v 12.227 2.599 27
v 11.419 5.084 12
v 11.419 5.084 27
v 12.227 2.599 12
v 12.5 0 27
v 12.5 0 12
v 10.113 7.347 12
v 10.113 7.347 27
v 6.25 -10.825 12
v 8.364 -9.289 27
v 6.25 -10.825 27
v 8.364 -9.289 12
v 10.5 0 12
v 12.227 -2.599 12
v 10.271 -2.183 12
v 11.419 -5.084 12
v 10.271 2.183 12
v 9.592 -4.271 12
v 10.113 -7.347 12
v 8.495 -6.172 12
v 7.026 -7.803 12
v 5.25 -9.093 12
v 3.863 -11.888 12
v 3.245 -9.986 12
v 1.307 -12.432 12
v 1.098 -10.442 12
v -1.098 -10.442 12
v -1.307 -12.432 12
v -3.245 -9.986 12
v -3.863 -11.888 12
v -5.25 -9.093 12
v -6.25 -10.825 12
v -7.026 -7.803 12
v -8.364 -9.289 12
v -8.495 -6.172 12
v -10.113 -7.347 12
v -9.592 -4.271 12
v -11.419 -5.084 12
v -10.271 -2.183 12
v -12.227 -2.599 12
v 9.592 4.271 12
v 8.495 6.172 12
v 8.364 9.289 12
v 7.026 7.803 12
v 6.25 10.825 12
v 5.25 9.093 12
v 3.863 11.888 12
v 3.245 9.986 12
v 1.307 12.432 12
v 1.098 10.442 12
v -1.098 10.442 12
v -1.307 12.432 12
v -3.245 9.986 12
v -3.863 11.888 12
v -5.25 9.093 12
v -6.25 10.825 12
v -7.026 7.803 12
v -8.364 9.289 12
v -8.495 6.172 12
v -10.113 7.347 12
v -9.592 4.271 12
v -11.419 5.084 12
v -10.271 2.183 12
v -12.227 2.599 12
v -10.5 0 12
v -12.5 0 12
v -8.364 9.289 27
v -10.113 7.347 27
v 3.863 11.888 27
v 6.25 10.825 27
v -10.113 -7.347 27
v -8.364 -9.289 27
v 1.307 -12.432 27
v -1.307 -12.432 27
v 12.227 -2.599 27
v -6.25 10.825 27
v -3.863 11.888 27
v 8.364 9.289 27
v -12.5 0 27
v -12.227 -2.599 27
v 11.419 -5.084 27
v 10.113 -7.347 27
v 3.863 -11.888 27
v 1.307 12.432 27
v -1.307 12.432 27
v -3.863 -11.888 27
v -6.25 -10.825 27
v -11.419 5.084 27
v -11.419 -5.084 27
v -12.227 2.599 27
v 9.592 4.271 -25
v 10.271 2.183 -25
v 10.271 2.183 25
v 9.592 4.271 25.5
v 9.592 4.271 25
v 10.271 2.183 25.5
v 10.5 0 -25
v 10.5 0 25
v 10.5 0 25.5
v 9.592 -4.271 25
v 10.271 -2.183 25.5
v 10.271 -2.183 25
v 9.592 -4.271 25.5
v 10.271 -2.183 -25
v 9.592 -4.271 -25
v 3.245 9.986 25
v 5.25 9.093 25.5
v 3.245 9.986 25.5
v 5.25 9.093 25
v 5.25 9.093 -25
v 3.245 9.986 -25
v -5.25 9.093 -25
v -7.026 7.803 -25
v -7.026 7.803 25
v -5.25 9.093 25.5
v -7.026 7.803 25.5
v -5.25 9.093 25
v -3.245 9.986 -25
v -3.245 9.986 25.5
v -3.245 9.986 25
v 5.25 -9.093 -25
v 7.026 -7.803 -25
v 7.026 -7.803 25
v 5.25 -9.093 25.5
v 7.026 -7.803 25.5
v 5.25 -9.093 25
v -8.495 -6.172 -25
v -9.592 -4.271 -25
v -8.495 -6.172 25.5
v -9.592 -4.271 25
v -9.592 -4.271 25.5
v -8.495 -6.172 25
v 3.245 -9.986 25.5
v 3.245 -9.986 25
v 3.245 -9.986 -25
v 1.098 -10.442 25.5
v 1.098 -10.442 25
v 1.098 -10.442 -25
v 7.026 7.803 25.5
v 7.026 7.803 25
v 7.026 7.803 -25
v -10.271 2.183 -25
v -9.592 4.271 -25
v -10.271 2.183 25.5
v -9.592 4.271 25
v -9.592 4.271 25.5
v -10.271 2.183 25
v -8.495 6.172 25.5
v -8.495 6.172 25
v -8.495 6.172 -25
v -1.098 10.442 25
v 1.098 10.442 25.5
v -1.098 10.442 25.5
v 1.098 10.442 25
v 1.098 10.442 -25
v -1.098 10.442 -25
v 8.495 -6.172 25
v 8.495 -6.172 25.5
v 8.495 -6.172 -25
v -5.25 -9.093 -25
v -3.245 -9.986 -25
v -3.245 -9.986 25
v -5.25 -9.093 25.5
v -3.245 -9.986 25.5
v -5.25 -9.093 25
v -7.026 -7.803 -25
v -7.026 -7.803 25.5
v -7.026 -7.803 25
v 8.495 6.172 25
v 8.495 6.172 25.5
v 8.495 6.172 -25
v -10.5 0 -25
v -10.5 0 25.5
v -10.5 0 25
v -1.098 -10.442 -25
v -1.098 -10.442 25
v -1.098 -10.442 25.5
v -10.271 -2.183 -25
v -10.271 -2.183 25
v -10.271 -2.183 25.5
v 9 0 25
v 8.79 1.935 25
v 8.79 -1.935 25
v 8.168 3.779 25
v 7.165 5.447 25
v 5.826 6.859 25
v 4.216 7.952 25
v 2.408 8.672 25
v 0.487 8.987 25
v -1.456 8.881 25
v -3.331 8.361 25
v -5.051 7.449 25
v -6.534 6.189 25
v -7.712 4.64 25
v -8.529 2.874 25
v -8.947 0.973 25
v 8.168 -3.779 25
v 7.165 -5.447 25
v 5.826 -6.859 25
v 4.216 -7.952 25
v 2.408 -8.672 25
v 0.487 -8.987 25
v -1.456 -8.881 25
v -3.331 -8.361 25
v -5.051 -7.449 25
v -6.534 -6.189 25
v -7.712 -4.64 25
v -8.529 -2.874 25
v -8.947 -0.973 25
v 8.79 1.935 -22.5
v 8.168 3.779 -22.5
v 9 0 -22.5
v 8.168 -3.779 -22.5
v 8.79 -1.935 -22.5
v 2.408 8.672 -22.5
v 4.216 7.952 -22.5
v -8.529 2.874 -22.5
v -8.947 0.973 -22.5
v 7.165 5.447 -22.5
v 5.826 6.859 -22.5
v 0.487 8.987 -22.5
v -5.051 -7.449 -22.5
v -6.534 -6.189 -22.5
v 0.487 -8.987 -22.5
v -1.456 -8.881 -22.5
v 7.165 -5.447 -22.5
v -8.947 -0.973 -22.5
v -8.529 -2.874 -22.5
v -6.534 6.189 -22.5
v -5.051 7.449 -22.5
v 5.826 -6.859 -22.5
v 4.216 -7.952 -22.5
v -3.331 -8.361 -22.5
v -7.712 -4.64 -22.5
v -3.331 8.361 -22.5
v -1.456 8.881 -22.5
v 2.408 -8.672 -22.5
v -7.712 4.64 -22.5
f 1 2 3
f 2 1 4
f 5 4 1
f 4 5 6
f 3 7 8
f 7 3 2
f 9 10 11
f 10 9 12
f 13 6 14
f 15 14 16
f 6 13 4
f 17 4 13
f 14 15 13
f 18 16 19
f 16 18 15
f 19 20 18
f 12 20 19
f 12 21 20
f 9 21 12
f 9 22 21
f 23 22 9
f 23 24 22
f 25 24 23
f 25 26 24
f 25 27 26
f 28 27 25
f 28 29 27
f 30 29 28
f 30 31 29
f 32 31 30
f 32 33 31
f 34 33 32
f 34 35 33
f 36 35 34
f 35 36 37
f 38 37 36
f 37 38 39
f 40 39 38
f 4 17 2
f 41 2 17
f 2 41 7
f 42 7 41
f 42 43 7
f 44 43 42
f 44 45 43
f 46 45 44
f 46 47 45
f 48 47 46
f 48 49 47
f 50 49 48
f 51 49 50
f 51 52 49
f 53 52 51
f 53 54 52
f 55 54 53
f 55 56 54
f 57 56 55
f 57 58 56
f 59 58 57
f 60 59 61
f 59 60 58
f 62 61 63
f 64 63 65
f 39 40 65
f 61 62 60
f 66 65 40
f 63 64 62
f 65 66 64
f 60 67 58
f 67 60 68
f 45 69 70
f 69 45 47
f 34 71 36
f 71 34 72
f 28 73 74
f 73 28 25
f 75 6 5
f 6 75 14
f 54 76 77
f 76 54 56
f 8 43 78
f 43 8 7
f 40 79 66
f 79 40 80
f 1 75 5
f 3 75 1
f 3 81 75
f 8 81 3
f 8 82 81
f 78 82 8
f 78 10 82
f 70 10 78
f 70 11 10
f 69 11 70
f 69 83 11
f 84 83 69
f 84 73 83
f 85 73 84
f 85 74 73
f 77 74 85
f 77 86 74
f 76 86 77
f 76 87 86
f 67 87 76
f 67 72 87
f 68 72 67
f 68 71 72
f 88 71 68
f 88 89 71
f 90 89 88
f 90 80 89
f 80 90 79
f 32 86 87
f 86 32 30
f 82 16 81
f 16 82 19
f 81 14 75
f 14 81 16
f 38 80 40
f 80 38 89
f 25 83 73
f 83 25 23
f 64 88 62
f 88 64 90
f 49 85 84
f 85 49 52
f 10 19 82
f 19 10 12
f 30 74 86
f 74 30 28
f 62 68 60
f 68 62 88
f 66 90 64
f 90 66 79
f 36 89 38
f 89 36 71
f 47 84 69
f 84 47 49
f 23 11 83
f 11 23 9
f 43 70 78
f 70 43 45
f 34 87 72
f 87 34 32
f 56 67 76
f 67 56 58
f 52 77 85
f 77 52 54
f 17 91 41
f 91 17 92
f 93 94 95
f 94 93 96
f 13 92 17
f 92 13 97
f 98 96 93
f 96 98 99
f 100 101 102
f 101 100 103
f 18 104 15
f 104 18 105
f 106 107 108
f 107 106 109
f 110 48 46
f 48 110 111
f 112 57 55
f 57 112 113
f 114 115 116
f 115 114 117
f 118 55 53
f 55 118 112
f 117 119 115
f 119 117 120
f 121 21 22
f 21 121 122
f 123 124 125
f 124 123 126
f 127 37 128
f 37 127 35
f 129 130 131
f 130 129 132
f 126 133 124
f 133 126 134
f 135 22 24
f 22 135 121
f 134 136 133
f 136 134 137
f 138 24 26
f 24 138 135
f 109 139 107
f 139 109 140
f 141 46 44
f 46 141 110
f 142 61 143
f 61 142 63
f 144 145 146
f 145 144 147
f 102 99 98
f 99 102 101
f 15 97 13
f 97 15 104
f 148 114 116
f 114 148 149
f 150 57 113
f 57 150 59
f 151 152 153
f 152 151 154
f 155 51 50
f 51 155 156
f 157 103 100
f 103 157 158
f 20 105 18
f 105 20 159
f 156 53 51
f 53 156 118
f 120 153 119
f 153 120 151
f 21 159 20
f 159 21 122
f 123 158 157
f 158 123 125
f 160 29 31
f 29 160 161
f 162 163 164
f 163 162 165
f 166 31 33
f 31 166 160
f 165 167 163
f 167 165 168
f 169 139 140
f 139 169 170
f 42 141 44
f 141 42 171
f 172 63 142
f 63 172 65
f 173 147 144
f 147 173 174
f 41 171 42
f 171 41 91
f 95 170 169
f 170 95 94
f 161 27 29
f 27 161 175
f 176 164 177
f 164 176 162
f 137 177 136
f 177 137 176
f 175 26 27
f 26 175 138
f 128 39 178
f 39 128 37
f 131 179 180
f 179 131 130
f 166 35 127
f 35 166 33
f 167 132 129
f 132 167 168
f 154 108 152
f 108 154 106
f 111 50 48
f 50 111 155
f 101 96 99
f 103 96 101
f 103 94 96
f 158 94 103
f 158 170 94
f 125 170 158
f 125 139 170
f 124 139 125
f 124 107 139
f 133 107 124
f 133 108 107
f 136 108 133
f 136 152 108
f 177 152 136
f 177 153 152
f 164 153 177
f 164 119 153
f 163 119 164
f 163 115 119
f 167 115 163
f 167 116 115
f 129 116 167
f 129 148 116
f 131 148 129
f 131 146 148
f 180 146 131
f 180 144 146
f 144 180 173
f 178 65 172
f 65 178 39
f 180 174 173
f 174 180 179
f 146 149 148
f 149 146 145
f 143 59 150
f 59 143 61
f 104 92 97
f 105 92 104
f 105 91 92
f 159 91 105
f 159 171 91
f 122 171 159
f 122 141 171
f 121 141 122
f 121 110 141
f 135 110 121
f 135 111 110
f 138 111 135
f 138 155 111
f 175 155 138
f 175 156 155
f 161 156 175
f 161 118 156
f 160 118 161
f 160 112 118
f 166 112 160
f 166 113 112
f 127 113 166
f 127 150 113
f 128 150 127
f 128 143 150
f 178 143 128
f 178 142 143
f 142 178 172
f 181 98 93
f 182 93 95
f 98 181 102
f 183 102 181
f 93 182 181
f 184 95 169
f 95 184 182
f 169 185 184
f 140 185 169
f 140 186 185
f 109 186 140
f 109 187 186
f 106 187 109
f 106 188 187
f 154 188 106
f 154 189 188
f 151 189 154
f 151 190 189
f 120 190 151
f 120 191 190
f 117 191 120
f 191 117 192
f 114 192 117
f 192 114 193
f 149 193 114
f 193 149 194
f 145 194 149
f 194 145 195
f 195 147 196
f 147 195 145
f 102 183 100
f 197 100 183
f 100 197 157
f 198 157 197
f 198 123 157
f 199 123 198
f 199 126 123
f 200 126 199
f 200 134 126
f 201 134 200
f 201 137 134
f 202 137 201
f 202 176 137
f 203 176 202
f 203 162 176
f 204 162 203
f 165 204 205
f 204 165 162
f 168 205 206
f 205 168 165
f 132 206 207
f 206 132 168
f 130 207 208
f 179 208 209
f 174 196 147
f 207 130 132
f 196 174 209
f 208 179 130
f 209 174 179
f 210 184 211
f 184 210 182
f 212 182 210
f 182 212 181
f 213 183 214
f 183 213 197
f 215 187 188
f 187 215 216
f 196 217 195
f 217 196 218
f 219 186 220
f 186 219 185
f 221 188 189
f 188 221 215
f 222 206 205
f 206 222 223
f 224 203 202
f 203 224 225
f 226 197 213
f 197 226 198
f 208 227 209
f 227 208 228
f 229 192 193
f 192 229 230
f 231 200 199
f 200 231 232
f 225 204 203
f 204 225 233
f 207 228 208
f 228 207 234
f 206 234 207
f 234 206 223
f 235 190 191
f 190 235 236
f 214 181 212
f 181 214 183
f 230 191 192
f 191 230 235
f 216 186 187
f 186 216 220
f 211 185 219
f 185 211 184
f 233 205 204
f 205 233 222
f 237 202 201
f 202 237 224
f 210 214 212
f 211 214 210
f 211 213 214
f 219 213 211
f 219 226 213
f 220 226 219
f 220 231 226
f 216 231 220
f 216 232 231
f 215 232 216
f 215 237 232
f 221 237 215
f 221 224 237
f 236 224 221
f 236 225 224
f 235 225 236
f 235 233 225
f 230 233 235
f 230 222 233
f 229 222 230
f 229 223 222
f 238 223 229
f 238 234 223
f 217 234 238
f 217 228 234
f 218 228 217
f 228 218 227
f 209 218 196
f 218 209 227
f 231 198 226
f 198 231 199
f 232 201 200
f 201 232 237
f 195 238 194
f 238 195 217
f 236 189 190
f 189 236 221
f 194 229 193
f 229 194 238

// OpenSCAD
hTube=50; // Hauteur pullulier
rTube=10.5; // Rayon

// Pillulier (H:50mm, D:21mm), fond plat
module tube(){
    difference() {
        cylinder(hTube,rTube,rTube,true);
        translate([0,0,2]){
            cylinder(hTube-1,rTube-1.5,rTube-1.5,true);
        }
    };
}

// Bouchon (bords +2mm) de pillulier large permettant blocage
module tubeGrosBouchon(){
    color("lightgray");
    translate([0,0,hTube/2-5.5]){
        difference(){
            cylinder(15, rTube+2,rTube+2,true);
            translate([0,0,-1]){
                cylinder(14, rTube,rTube,true);
            }
        }
    }
    tube();
}

color("lightgray") tubeGrosBouchon();
